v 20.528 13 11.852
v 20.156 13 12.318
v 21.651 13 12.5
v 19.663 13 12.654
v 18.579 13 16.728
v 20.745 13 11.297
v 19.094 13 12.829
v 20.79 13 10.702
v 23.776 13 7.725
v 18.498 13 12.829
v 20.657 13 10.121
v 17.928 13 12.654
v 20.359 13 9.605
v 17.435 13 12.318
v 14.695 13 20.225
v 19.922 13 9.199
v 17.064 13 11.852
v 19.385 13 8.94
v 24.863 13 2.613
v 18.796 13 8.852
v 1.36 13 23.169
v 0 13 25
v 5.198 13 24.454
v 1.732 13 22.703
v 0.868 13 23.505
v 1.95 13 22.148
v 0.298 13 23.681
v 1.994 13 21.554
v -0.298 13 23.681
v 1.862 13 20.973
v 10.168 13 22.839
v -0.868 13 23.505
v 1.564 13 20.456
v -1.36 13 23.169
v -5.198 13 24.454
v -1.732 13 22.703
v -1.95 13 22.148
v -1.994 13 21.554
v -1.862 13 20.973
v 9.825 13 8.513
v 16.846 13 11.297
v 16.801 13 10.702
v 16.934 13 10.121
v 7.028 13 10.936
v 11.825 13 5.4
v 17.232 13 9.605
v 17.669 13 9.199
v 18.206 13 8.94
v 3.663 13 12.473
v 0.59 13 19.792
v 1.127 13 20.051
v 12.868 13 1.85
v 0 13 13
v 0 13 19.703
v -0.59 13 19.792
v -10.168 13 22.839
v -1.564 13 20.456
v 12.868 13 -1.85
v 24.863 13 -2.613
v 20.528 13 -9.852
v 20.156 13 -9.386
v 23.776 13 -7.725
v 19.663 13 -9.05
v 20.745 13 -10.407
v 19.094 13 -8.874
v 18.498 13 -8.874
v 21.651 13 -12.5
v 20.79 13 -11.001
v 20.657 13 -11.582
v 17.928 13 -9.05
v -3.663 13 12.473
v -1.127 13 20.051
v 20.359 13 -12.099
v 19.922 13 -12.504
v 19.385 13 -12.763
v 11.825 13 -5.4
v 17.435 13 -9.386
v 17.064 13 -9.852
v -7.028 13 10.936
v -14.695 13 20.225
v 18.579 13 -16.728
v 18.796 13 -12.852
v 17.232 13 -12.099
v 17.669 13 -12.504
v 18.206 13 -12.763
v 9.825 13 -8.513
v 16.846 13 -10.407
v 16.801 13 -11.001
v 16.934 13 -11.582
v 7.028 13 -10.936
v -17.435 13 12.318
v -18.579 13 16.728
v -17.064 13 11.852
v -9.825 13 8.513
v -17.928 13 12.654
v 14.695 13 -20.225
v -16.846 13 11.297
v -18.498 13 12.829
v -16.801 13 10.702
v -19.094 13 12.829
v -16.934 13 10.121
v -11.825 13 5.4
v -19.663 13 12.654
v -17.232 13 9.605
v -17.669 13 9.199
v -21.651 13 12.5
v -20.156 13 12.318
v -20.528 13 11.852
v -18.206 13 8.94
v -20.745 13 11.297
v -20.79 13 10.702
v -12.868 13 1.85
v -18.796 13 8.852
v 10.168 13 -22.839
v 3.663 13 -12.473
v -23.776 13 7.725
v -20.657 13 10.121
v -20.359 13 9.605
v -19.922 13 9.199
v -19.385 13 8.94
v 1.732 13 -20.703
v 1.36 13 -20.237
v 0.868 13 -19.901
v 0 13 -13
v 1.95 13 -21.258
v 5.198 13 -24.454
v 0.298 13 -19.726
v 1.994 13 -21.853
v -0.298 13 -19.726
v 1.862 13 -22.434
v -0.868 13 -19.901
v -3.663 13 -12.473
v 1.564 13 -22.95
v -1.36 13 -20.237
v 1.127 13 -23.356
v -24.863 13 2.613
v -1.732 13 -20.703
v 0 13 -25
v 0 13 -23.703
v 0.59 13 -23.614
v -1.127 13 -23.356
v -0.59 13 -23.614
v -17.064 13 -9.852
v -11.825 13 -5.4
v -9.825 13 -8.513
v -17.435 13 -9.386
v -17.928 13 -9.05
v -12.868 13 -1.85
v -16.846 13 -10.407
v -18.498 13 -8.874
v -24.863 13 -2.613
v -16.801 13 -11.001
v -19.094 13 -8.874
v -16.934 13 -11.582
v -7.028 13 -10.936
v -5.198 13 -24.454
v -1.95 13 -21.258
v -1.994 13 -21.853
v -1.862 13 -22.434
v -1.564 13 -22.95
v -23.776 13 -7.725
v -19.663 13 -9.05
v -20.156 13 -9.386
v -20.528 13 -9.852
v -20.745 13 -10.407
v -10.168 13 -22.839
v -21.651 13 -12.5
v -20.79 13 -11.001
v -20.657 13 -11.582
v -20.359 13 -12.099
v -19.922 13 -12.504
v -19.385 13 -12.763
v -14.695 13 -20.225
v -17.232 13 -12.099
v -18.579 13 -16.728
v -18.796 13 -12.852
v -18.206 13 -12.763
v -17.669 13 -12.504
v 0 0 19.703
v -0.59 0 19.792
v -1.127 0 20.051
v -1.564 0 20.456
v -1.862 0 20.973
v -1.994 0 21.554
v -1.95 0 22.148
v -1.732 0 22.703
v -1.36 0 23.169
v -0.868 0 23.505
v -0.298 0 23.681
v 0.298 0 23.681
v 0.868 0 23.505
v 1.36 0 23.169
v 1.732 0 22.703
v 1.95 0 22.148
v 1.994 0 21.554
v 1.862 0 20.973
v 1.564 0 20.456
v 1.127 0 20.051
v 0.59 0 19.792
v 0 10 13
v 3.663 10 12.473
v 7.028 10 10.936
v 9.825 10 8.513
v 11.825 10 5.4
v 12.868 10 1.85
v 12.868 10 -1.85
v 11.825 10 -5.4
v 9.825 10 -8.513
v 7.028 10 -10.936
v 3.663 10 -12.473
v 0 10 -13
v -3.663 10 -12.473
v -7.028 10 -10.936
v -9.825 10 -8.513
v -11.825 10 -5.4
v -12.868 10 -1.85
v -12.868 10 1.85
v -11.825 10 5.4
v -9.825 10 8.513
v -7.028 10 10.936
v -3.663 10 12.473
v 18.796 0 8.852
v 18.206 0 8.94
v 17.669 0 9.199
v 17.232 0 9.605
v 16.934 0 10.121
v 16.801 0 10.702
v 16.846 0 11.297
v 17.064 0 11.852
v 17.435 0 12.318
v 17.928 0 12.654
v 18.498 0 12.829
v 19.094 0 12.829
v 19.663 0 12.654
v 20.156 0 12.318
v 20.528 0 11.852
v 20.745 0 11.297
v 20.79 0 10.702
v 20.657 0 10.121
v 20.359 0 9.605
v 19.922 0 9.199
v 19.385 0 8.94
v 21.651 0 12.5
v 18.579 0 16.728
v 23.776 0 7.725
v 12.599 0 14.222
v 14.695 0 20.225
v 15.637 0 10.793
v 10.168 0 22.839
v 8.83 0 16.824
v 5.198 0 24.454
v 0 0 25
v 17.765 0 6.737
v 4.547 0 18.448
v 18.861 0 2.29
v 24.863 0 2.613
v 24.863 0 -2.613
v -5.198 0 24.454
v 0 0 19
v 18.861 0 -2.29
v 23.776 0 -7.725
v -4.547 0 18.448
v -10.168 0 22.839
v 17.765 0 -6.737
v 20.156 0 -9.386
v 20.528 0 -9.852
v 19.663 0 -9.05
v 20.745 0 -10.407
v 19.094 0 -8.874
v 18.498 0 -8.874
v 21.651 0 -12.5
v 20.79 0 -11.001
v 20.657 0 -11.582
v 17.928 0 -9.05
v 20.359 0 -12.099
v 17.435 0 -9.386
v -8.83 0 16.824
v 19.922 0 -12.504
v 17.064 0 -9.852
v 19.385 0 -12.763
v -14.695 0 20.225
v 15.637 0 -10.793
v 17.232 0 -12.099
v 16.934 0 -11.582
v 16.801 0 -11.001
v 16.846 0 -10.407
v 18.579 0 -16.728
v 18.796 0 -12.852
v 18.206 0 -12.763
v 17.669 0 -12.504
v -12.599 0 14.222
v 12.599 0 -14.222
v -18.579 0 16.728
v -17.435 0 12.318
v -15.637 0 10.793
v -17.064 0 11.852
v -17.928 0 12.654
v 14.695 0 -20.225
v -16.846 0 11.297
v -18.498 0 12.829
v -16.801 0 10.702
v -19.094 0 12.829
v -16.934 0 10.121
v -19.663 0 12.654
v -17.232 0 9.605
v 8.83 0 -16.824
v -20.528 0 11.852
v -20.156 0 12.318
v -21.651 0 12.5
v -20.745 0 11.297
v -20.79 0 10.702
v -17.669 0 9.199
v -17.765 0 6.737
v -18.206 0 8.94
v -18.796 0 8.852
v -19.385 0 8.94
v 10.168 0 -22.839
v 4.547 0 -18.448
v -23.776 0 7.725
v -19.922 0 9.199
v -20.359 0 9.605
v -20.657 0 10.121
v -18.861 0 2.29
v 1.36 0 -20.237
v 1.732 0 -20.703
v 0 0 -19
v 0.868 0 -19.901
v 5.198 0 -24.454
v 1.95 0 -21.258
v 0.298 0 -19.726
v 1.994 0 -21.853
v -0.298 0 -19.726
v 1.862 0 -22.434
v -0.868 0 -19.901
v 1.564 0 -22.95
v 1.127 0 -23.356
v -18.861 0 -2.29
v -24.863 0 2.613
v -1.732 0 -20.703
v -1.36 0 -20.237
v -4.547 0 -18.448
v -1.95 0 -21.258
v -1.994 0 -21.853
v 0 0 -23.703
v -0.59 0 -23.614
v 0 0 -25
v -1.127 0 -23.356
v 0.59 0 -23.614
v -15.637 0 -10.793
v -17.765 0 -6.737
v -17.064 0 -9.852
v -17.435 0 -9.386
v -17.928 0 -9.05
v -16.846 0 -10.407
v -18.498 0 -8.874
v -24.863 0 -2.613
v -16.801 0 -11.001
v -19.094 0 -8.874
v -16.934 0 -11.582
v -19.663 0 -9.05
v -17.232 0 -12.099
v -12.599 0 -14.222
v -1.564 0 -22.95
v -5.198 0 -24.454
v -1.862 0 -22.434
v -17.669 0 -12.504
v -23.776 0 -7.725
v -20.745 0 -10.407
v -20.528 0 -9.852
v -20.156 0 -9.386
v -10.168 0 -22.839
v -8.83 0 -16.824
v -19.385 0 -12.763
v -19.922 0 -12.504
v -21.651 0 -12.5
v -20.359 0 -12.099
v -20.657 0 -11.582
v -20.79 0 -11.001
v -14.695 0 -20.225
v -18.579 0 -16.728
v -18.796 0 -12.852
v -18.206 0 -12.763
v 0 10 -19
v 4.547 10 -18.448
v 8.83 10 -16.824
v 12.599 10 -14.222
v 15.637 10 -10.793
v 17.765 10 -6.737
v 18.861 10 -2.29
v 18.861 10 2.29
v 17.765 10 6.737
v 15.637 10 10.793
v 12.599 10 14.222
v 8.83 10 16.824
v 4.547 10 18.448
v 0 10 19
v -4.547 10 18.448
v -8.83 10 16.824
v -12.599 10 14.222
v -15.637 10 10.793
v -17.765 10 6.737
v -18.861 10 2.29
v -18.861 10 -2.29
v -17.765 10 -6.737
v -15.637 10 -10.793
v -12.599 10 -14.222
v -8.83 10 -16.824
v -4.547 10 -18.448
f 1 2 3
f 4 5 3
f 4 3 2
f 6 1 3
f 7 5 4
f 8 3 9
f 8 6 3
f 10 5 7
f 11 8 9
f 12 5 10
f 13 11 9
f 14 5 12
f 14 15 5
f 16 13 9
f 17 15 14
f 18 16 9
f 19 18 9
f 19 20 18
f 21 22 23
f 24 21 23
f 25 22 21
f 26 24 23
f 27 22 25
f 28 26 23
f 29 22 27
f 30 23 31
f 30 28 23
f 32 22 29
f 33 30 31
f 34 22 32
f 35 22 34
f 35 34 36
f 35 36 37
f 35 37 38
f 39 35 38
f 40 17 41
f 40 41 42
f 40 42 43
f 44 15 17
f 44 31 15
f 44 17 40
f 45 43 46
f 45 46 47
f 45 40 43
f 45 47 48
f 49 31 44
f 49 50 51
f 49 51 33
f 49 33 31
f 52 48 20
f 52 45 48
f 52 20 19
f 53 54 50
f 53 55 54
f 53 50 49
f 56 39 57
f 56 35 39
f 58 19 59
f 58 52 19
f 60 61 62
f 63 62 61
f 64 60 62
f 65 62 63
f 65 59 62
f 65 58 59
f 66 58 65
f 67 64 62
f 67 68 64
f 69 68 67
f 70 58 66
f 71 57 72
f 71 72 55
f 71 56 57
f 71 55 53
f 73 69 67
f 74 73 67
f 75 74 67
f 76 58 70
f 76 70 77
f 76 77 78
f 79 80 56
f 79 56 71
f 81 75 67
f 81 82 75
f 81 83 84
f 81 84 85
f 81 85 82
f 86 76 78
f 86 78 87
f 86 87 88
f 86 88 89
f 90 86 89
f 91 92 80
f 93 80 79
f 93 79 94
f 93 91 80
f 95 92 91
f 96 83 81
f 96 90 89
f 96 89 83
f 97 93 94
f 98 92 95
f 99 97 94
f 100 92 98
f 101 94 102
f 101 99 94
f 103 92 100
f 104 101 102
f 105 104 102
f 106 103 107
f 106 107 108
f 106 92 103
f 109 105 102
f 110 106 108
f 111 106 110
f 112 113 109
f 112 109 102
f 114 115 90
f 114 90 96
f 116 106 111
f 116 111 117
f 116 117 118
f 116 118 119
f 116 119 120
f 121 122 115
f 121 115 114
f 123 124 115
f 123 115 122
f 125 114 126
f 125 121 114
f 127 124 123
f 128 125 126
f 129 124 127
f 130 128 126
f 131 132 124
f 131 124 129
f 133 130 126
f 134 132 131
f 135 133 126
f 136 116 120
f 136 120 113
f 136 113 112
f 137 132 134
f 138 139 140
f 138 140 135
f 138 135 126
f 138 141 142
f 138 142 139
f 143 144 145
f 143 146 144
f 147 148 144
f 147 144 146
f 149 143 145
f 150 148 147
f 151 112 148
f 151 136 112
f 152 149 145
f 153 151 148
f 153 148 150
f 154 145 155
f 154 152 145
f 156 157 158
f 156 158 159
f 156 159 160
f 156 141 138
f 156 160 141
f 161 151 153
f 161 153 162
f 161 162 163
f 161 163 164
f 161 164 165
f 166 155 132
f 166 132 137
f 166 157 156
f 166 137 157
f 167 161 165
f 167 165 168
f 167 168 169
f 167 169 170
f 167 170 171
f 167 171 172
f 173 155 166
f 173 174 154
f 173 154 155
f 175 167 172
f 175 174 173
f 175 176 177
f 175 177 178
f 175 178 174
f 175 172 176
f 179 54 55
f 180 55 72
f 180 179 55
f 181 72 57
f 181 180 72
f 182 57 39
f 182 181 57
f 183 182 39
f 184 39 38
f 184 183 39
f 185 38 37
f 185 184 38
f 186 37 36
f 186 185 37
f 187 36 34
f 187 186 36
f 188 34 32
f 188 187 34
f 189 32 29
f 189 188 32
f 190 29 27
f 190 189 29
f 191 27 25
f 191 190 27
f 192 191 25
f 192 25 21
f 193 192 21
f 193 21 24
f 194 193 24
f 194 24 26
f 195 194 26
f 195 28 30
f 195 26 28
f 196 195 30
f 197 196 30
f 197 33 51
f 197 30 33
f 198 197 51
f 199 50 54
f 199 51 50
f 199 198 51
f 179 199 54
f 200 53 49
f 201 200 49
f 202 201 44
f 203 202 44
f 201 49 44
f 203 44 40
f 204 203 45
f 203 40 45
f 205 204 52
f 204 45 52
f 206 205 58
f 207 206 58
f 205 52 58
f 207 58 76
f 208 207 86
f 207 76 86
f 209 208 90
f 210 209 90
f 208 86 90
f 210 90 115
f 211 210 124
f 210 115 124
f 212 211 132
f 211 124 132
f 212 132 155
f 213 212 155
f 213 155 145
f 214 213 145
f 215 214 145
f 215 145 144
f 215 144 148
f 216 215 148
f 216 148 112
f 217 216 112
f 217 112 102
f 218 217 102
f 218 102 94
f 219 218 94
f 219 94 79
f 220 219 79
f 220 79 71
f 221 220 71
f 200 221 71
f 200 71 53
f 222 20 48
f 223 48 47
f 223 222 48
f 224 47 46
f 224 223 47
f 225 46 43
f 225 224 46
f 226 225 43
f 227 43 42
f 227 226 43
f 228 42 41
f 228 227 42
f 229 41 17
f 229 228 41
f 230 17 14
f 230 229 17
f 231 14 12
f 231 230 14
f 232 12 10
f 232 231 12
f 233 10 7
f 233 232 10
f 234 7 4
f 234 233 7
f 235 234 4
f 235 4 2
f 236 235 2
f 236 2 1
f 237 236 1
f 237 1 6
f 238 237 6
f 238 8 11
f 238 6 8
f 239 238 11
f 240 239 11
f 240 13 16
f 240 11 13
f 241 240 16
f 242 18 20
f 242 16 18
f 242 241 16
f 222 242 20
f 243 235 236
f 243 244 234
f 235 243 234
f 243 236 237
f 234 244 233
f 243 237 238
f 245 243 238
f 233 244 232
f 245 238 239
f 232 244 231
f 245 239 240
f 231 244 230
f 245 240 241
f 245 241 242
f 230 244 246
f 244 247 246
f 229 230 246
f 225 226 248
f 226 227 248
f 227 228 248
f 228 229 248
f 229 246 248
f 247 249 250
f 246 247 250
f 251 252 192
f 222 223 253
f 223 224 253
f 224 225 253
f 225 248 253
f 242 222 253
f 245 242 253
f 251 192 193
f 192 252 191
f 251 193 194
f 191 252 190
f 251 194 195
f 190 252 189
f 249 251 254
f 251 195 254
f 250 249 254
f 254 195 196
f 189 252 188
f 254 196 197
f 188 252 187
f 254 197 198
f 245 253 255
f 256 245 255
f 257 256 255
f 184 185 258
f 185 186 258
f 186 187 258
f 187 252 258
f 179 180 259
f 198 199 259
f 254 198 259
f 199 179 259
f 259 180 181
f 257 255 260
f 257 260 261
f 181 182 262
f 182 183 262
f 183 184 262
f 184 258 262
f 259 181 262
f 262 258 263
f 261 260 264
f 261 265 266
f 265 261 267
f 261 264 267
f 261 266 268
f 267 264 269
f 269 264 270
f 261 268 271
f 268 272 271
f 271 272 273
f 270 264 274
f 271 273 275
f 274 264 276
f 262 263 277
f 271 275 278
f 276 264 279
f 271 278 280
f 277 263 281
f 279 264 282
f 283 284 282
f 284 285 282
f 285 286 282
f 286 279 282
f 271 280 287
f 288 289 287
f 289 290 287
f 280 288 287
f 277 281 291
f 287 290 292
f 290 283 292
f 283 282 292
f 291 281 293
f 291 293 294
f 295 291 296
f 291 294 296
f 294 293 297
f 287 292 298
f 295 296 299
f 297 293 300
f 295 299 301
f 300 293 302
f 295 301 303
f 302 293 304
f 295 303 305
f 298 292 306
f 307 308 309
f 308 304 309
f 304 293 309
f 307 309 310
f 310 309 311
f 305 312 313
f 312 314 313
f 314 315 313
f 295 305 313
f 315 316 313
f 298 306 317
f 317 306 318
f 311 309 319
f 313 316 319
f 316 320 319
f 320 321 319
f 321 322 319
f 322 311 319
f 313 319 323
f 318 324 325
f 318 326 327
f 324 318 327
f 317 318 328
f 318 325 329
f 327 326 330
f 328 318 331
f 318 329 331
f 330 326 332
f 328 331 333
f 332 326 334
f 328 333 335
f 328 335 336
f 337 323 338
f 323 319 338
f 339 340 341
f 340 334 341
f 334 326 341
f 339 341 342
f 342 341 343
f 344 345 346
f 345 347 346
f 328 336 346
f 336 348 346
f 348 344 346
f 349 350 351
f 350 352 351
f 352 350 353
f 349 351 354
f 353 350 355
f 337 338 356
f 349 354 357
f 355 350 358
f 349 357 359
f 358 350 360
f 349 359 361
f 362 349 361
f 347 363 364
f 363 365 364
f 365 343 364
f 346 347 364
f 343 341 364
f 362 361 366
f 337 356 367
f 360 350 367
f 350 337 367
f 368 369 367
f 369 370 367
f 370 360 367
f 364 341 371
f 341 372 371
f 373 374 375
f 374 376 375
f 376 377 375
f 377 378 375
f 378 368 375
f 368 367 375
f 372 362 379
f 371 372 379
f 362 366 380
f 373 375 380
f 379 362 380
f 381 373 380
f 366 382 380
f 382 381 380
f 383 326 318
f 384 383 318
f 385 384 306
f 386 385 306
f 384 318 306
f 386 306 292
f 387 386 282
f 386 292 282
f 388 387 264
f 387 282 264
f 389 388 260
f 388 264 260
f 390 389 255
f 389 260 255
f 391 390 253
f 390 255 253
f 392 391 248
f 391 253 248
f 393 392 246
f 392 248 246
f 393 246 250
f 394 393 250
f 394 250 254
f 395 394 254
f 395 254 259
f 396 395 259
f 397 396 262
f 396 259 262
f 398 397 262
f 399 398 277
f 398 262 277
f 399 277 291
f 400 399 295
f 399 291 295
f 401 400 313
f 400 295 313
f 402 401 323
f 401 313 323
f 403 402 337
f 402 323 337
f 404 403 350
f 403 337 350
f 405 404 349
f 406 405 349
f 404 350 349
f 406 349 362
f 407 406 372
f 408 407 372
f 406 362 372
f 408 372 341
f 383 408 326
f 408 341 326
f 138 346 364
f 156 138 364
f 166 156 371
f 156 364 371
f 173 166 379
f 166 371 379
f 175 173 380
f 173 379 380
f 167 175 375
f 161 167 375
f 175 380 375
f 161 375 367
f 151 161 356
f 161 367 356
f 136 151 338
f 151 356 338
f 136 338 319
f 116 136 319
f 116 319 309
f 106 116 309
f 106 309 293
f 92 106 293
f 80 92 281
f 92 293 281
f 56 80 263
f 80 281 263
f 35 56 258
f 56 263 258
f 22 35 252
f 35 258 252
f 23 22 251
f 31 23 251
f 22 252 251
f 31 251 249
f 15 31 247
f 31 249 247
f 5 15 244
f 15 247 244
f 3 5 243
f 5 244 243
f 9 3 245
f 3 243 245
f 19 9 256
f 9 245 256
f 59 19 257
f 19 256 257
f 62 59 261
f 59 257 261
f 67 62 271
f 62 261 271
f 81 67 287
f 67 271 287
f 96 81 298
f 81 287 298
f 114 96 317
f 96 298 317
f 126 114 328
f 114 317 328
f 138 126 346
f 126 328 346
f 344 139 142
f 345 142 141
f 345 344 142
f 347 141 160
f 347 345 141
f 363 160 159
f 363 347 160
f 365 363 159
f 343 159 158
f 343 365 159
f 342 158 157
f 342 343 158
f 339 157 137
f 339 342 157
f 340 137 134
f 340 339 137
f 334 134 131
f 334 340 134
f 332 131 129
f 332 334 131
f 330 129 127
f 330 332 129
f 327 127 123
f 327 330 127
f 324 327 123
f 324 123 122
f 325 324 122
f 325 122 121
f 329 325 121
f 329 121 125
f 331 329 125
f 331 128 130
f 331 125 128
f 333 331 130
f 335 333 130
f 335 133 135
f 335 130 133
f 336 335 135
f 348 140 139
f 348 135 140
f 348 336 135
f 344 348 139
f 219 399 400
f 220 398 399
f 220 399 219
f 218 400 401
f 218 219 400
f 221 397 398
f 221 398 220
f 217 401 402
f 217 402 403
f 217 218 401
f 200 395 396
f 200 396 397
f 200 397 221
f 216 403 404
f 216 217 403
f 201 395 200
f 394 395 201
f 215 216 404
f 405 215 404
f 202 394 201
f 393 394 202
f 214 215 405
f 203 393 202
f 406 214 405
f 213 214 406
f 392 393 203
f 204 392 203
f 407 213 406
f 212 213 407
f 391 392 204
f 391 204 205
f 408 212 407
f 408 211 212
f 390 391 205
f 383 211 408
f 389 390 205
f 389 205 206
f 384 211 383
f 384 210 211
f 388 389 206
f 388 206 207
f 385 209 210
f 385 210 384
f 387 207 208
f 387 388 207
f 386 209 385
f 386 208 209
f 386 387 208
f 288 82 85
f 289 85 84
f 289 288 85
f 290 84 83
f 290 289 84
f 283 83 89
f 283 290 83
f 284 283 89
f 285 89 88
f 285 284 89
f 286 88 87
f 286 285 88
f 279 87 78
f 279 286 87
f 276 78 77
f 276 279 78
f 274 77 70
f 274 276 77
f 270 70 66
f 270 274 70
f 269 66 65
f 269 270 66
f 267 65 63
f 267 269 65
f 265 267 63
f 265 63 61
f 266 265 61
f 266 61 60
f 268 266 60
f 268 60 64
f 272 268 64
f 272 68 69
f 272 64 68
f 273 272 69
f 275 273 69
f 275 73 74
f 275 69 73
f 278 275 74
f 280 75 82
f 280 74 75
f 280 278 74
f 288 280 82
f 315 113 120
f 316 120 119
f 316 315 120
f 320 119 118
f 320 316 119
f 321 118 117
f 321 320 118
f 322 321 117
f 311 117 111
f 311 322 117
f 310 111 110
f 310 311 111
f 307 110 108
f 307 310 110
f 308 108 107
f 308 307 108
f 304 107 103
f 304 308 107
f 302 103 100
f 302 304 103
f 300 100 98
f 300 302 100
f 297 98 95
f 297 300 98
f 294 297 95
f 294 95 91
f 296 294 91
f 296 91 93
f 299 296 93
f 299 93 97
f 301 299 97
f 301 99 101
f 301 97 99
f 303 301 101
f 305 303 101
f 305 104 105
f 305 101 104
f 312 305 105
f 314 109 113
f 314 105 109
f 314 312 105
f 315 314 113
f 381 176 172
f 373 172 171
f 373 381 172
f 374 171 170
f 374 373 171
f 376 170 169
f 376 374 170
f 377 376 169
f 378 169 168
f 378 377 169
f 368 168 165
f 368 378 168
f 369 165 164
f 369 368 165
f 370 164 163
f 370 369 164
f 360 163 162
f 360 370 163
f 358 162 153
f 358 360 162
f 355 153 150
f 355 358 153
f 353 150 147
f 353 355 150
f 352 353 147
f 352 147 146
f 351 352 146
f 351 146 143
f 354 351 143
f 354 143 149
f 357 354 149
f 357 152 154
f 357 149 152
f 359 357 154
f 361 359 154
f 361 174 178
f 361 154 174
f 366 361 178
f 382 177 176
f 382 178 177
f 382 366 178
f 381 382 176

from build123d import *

# Parameters (mm, degrees)
SKETCH_1_R          = 25
EXTRUDE_1_DEPTH     = 13
SKETCH_3_R          = 2
CUT_EXTRUDE_3_DEPTH = 38.669616404
SKETCH_4_R          = 19
CUT_EXTRUDE_1_DEPTH = 10
SKETCH_5_R          = 13
CUT_EXTRUDE_2_DEPTH = 38.669616404


with BuildPart() as part:
    # Эскиз1 → Вытянуть1 (new body)
    with BuildSketch(Plane(origin=(0, 0, 0), x_dir=(1, 0, 0), z_dir=(0, 1, 0))):
        with Locations(Location((0, 0, 0), (0, 0, 90))):
            Circle(SKETCH_1_R)
    extrude(amount=EXTRUDE_1_DEPTH)

    # Эскиз3 → Вытянуть3 (cut, through all)
    with BuildSketch(Plane(origin=(0, 0, 0), x_dir=(1, 0, 0), z_dir=(0, 1, 0))):
        with Locations(Location((0, 21.703286444, 0), (0, 0, 90))):
            Circle(SKETCH_3_R)
        with Locations(Location((18.795597406, 10.851643222, 0), (0, 0, 90))):
            Circle(SKETCH_3_R)
        with Locations(Location((18.795597406, -10.851643222, 0), (0, 0, 90))):
            Circle(SKETCH_3_R)
        with Locations(Location((0, -21.703286444, 0), (0, 0, 90))):
            Circle(SKETCH_3_R)
        with Locations(Location((-18.795597406, -10.851643222, 0), (0, 0, 90))):
            Circle(SKETCH_3_R)
        with Locations(Location((-18.795597406, 10.851643222, 0), (0, 0, 90))):
            Circle(SKETCH_3_R)
    extrude(amount=CUT_EXTRUDE_3_DEPTH, mode=Mode.SUBTRACT)

    # Эскиз4 → Вырез-Вытянуть1 (cut)
    with BuildSketch(Plane.XZ):
        with Locations(Location((0, 0, 0), (0, 0, 270))):
            Circle(SKETCH_4_R)
    extrude(amount=-CUT_EXTRUDE_1_DEPTH, mode=Mode.SUBTRACT)

    # Эскиз5 → Вырез-Вытянуть2 (cut, through all)
    with BuildSketch(Plane(origin=(0, 13, 0), x_dir=(1, 0, 0), z_dir=(0, 1, 0))):
        with Locations(Location((0, 0, 0), (0, 0, 270))):
            Circle(SKETCH_5_R)
    extrude(amount=-CUT_EXTRUDE_2_DEPTH, mode=Mode.SUBTRACT)


solid = part.part
